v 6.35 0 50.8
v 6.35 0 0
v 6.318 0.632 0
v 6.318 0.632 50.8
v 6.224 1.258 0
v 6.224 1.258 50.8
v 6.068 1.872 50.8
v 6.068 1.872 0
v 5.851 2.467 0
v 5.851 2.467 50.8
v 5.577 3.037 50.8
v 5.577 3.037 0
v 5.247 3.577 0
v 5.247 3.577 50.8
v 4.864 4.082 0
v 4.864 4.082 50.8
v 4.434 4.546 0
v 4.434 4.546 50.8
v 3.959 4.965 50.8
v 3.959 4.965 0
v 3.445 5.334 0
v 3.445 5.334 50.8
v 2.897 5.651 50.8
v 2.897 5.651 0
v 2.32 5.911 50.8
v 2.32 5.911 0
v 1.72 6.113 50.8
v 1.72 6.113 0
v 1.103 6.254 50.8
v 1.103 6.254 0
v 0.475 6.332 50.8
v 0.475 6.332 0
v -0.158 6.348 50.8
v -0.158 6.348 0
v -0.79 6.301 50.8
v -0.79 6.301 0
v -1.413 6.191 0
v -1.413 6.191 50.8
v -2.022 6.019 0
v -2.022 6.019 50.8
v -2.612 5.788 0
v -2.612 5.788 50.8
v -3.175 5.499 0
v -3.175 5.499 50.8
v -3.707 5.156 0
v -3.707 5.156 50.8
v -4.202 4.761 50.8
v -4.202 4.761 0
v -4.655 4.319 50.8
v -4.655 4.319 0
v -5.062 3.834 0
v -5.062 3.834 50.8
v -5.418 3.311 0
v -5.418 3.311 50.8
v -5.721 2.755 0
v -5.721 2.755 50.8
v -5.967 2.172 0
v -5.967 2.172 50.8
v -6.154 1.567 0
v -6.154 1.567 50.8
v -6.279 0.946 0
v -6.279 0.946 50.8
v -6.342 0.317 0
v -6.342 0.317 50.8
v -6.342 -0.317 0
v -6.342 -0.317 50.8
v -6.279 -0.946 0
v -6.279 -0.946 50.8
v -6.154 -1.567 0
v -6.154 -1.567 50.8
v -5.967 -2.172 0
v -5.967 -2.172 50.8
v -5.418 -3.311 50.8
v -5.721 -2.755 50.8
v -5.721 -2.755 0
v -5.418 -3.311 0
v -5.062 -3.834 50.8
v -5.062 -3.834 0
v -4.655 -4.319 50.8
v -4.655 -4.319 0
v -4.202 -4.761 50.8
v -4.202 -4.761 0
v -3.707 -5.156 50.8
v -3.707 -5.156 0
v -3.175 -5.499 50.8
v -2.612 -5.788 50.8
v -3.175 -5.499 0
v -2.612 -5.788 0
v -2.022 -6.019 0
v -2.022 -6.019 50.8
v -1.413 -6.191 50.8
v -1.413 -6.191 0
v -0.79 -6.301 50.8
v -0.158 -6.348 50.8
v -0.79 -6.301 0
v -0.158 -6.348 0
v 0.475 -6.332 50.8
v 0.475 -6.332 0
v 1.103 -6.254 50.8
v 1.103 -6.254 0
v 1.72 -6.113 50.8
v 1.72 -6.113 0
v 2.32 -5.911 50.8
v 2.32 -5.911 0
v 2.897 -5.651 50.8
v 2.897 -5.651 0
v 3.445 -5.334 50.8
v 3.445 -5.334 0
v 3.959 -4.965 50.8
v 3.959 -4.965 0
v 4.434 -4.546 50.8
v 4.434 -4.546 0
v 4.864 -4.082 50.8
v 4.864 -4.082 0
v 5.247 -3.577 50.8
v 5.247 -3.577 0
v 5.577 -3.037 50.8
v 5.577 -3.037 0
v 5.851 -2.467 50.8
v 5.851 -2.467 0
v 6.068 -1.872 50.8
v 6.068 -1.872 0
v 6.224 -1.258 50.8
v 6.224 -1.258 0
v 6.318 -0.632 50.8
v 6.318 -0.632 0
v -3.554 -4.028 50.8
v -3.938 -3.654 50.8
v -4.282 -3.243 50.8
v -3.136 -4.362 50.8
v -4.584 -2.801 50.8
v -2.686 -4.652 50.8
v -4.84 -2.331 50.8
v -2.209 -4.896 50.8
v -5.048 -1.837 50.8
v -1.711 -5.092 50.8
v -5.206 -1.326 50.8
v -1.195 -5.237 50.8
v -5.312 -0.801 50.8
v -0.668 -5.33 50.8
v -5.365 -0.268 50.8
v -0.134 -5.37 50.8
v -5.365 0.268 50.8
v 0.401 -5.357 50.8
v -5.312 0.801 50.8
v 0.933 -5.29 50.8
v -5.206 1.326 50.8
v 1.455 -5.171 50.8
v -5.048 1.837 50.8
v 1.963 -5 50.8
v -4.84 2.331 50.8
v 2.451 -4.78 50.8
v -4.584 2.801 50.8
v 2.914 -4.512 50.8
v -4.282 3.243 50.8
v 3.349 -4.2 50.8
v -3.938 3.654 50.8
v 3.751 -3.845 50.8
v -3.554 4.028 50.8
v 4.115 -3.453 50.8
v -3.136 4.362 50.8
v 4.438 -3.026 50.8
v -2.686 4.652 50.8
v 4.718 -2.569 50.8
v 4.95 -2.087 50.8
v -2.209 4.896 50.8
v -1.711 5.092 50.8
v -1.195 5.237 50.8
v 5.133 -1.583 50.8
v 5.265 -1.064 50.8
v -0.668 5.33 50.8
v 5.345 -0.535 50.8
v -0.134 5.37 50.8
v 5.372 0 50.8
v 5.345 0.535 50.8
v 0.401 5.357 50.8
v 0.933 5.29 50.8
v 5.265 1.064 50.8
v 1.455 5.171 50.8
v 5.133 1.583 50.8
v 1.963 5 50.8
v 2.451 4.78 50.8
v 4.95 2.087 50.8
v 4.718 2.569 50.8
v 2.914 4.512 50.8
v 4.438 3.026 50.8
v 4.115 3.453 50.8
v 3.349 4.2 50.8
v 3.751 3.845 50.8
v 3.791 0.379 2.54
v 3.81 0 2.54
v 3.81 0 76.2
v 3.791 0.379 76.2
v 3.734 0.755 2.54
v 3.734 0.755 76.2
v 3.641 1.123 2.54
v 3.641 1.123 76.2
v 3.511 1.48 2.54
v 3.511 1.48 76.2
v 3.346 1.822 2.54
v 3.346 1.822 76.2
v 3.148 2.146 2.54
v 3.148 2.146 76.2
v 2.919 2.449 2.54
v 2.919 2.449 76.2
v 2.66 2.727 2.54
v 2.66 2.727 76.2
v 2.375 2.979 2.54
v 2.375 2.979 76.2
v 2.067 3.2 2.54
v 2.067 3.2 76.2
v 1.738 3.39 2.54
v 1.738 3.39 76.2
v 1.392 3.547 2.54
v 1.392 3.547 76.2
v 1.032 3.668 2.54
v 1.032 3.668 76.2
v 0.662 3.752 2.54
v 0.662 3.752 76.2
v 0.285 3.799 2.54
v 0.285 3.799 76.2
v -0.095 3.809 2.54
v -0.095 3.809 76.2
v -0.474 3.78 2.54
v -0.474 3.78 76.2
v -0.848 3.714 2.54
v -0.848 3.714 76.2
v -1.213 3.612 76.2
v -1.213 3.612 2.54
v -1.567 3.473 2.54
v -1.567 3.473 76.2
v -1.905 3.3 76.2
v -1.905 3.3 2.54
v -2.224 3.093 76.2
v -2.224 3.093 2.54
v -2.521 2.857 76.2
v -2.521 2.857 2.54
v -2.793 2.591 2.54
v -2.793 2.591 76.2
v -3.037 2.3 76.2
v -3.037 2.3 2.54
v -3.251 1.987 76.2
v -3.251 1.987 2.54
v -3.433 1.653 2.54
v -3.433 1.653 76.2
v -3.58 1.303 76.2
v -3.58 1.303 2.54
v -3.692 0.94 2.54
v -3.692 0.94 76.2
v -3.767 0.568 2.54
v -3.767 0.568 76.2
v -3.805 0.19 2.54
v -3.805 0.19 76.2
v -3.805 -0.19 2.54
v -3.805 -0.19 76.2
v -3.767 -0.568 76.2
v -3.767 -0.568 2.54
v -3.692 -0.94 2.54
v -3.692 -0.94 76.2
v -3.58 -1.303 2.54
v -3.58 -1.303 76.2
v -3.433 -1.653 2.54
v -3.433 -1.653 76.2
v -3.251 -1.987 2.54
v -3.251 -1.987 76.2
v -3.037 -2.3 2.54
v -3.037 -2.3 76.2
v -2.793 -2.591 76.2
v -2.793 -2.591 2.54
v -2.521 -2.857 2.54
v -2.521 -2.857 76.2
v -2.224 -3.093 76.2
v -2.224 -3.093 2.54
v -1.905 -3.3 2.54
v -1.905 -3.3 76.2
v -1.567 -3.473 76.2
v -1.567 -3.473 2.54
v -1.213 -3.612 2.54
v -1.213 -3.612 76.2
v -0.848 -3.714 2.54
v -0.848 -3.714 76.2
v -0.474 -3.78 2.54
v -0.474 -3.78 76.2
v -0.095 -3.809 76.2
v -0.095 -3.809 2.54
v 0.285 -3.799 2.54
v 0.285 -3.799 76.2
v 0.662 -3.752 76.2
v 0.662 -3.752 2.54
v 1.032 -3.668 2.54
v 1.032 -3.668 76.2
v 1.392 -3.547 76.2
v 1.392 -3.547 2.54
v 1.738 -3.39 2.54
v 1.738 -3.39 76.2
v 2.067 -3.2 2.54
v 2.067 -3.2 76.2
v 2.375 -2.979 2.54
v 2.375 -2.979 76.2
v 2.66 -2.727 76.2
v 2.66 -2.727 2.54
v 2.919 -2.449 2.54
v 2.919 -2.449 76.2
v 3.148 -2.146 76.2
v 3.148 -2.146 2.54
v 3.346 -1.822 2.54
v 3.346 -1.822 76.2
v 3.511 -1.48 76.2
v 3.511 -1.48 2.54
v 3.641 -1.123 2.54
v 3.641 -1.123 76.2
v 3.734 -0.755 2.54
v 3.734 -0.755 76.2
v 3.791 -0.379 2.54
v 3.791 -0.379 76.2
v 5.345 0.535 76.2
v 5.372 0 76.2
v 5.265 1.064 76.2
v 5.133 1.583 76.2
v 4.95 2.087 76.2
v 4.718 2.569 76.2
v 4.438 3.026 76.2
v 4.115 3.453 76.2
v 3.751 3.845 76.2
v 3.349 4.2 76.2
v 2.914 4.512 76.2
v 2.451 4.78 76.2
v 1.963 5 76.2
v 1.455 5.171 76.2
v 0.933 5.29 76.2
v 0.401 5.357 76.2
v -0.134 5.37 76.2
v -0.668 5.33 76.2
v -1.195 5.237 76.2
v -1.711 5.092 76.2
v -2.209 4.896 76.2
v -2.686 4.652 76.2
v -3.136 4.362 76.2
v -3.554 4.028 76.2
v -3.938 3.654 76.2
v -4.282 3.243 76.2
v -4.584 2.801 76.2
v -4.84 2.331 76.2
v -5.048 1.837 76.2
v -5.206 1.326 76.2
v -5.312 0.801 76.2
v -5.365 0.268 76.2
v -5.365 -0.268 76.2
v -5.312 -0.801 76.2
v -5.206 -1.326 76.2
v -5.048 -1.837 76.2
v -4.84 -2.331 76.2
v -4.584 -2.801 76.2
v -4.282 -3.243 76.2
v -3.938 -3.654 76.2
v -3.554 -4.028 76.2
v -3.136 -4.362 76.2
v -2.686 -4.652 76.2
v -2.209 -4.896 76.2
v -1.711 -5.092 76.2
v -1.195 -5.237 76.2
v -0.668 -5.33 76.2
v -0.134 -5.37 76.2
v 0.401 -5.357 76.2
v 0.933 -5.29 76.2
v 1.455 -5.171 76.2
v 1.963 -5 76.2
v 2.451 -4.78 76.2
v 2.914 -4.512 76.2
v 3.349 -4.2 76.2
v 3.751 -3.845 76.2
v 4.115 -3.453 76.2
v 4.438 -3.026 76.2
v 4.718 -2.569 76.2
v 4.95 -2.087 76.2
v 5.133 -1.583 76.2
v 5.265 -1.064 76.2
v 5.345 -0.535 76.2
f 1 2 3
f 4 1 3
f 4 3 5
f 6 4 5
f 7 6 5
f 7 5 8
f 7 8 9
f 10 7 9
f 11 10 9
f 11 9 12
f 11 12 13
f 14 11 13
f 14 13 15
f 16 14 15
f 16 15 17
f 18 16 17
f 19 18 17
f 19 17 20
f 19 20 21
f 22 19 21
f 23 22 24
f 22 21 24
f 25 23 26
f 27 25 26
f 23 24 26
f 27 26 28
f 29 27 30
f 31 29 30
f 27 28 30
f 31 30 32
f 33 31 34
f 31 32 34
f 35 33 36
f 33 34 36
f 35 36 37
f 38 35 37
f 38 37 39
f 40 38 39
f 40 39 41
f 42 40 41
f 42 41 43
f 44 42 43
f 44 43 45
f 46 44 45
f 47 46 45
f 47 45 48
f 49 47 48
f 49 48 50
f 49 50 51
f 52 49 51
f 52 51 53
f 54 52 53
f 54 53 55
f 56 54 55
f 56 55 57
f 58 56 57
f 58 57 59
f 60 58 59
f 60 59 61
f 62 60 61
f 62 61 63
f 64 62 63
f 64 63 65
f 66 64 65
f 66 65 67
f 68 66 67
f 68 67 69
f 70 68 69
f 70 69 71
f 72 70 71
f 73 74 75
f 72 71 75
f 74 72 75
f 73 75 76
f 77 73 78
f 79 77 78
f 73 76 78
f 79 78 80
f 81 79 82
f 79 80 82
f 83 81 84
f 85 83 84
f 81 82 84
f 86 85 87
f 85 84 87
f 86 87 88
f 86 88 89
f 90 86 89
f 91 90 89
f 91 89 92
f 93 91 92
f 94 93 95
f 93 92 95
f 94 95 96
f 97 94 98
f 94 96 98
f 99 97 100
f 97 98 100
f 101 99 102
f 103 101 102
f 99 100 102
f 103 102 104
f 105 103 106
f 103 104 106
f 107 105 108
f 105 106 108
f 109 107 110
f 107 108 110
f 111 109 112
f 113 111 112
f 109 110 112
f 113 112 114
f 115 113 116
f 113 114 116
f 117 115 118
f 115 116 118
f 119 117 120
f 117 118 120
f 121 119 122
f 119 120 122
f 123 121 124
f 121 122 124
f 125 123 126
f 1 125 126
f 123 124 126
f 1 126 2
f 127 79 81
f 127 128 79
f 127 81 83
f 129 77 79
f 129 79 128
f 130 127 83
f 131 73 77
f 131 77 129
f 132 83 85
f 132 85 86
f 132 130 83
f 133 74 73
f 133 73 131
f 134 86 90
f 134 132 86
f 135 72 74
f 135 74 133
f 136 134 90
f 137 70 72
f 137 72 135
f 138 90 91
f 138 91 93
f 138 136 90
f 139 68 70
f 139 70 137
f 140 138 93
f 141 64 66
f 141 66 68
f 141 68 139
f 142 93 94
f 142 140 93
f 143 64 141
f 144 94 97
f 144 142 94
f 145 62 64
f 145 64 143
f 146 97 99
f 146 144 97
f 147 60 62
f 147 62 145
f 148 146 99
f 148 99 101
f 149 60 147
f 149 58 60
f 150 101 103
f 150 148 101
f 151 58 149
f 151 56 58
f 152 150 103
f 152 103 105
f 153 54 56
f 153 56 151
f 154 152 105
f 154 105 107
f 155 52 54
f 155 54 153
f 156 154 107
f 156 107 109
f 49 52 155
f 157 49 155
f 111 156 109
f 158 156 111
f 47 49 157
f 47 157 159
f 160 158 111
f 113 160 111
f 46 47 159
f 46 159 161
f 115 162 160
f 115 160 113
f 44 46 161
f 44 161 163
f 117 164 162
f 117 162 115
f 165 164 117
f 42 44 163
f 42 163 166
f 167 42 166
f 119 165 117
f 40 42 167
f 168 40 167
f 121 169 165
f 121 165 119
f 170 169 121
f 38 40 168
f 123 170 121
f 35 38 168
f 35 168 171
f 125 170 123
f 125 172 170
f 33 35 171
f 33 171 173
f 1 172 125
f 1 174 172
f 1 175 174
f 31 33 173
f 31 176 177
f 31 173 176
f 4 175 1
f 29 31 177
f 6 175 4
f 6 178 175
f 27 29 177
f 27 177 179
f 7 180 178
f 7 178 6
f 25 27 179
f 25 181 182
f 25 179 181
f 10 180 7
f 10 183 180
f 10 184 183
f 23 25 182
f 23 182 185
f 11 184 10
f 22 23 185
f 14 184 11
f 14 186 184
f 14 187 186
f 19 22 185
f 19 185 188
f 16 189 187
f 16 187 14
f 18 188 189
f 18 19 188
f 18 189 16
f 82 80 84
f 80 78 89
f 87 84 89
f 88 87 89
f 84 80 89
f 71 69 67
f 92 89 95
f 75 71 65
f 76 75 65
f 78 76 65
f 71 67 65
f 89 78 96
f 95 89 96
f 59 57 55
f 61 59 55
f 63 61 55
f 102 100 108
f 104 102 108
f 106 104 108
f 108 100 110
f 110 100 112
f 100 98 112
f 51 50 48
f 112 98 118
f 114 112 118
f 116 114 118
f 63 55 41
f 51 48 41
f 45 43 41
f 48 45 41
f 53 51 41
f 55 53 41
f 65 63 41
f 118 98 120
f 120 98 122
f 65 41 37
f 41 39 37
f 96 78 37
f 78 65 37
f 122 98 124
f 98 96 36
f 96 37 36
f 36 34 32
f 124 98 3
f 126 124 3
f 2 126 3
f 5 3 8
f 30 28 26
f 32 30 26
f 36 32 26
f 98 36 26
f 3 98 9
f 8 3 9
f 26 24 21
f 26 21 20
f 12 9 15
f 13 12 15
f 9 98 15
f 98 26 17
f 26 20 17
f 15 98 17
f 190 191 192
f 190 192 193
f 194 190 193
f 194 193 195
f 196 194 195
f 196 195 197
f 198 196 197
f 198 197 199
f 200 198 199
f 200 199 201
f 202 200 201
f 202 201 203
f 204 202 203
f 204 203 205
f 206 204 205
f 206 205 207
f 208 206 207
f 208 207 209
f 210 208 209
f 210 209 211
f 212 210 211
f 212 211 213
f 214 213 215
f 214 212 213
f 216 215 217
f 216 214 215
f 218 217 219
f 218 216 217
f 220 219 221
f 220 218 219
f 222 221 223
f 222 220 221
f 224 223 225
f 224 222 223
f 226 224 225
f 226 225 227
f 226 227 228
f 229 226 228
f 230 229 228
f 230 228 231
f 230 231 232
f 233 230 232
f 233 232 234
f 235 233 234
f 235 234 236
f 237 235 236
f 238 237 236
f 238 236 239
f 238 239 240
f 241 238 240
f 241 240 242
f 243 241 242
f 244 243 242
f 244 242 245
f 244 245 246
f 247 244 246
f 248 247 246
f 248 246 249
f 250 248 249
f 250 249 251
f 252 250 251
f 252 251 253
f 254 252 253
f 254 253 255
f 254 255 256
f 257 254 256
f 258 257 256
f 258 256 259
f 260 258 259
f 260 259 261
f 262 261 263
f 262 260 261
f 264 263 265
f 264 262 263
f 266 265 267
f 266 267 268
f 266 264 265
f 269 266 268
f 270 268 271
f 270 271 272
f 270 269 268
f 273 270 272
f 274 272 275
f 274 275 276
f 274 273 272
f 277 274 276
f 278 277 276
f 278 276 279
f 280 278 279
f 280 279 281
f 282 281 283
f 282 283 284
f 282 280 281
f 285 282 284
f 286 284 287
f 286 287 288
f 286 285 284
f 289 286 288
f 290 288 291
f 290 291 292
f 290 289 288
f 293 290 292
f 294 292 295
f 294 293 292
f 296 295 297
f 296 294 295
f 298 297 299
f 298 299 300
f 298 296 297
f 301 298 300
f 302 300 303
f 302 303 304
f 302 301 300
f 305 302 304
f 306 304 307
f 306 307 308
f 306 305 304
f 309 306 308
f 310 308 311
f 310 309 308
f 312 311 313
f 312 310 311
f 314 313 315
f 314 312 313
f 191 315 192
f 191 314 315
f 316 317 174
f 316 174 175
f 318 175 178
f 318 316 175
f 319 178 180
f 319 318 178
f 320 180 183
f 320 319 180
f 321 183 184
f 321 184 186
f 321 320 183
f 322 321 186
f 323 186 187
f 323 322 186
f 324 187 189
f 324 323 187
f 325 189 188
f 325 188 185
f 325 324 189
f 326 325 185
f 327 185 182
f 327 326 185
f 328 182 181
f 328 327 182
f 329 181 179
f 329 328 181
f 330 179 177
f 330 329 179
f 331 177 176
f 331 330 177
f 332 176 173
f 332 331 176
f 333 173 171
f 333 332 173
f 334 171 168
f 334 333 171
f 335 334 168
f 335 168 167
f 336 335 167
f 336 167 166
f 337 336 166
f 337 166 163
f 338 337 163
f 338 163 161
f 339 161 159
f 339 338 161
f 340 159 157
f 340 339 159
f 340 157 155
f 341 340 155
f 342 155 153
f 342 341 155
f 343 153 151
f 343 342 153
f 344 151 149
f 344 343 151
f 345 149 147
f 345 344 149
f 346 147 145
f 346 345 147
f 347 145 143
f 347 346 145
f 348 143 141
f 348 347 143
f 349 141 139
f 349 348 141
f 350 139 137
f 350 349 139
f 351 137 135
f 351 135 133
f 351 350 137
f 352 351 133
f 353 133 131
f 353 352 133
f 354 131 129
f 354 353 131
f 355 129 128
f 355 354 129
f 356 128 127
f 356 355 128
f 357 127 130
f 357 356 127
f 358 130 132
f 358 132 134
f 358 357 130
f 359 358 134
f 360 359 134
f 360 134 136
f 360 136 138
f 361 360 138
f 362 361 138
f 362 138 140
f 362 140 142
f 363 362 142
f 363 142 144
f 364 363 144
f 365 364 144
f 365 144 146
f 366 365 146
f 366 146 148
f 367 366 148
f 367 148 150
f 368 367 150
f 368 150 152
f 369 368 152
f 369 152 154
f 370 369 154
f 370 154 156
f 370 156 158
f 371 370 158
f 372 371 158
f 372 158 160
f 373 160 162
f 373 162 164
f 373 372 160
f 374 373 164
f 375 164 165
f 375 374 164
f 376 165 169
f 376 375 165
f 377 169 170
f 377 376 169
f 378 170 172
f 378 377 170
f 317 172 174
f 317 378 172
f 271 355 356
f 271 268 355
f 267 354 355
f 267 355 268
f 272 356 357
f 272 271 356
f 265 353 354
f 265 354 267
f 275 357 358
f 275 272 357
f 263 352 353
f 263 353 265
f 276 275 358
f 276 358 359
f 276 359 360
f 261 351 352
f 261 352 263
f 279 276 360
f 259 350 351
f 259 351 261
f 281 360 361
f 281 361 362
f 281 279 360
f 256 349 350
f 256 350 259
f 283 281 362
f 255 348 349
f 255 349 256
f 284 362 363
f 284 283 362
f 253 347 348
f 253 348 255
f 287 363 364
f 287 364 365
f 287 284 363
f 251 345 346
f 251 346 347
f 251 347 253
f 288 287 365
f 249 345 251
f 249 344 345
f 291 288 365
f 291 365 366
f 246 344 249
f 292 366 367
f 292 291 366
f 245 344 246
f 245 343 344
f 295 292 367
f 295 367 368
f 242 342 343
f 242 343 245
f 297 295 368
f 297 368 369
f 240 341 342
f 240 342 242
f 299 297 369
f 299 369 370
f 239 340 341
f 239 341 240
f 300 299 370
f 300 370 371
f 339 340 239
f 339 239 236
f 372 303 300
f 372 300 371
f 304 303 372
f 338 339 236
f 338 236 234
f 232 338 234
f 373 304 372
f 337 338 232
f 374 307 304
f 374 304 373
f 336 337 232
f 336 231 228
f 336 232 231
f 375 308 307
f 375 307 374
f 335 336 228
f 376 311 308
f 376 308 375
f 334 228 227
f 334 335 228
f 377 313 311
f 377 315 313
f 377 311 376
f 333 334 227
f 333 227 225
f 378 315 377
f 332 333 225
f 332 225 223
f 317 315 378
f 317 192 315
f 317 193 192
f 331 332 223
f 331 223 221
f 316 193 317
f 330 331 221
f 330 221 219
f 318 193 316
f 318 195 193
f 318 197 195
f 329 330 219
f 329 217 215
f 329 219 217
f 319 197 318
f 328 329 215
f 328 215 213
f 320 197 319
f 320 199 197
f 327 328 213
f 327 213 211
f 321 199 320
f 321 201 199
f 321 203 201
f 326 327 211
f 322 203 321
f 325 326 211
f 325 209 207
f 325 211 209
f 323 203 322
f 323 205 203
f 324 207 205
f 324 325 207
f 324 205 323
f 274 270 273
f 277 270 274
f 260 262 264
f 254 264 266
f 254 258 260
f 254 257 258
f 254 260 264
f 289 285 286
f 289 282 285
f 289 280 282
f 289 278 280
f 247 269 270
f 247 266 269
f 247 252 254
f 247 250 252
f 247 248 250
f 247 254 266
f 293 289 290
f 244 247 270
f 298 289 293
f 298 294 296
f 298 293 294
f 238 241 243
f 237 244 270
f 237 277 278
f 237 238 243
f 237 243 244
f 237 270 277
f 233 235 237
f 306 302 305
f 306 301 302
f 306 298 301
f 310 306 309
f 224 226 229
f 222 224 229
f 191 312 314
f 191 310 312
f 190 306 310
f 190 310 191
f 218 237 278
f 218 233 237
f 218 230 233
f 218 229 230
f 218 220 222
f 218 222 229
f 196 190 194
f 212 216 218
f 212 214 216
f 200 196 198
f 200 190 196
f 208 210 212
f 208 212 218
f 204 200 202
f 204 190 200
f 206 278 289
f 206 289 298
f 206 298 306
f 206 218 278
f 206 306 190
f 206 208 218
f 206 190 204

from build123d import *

# Parameters (mm, degrees)
F0_R     = 6.35
F1_DEPTH = 76.2
F2_T     = -2.54
F5_R     = 6.35
F5_R_2   = 5.3717360651
F6_DEPTH = 25.4


# Not quite as in the source:
# - the program builds the solid bodies; features that only make, move or delete a surface that nothing else refers to are left out


with BuildPart() as f1:
    # F0 (on Top) → F1 (new body)
    with BuildSketch(Plane.XY):
        Circle(F0_R)
    extrude(amount=F1_DEPTH)

    # F2
    f2_openings = [f1.faces().sort_by_distance(p)[0] for p in [
        (0, 0, 76.2),
    ]]
    offset(amount=F2_T, openings=f2_openings)

    # F5 (on face) → F6 (cut)
    with BuildSketch(Plane.XY.offset(76.2)):
        Circle(F5_R)
        Circle(F5_R_2, mode=Mode.SUBTRACT)
    extrude(amount=-F6_DEPTH, mode=Mode.SUBTRACT)


solid = f1.part
